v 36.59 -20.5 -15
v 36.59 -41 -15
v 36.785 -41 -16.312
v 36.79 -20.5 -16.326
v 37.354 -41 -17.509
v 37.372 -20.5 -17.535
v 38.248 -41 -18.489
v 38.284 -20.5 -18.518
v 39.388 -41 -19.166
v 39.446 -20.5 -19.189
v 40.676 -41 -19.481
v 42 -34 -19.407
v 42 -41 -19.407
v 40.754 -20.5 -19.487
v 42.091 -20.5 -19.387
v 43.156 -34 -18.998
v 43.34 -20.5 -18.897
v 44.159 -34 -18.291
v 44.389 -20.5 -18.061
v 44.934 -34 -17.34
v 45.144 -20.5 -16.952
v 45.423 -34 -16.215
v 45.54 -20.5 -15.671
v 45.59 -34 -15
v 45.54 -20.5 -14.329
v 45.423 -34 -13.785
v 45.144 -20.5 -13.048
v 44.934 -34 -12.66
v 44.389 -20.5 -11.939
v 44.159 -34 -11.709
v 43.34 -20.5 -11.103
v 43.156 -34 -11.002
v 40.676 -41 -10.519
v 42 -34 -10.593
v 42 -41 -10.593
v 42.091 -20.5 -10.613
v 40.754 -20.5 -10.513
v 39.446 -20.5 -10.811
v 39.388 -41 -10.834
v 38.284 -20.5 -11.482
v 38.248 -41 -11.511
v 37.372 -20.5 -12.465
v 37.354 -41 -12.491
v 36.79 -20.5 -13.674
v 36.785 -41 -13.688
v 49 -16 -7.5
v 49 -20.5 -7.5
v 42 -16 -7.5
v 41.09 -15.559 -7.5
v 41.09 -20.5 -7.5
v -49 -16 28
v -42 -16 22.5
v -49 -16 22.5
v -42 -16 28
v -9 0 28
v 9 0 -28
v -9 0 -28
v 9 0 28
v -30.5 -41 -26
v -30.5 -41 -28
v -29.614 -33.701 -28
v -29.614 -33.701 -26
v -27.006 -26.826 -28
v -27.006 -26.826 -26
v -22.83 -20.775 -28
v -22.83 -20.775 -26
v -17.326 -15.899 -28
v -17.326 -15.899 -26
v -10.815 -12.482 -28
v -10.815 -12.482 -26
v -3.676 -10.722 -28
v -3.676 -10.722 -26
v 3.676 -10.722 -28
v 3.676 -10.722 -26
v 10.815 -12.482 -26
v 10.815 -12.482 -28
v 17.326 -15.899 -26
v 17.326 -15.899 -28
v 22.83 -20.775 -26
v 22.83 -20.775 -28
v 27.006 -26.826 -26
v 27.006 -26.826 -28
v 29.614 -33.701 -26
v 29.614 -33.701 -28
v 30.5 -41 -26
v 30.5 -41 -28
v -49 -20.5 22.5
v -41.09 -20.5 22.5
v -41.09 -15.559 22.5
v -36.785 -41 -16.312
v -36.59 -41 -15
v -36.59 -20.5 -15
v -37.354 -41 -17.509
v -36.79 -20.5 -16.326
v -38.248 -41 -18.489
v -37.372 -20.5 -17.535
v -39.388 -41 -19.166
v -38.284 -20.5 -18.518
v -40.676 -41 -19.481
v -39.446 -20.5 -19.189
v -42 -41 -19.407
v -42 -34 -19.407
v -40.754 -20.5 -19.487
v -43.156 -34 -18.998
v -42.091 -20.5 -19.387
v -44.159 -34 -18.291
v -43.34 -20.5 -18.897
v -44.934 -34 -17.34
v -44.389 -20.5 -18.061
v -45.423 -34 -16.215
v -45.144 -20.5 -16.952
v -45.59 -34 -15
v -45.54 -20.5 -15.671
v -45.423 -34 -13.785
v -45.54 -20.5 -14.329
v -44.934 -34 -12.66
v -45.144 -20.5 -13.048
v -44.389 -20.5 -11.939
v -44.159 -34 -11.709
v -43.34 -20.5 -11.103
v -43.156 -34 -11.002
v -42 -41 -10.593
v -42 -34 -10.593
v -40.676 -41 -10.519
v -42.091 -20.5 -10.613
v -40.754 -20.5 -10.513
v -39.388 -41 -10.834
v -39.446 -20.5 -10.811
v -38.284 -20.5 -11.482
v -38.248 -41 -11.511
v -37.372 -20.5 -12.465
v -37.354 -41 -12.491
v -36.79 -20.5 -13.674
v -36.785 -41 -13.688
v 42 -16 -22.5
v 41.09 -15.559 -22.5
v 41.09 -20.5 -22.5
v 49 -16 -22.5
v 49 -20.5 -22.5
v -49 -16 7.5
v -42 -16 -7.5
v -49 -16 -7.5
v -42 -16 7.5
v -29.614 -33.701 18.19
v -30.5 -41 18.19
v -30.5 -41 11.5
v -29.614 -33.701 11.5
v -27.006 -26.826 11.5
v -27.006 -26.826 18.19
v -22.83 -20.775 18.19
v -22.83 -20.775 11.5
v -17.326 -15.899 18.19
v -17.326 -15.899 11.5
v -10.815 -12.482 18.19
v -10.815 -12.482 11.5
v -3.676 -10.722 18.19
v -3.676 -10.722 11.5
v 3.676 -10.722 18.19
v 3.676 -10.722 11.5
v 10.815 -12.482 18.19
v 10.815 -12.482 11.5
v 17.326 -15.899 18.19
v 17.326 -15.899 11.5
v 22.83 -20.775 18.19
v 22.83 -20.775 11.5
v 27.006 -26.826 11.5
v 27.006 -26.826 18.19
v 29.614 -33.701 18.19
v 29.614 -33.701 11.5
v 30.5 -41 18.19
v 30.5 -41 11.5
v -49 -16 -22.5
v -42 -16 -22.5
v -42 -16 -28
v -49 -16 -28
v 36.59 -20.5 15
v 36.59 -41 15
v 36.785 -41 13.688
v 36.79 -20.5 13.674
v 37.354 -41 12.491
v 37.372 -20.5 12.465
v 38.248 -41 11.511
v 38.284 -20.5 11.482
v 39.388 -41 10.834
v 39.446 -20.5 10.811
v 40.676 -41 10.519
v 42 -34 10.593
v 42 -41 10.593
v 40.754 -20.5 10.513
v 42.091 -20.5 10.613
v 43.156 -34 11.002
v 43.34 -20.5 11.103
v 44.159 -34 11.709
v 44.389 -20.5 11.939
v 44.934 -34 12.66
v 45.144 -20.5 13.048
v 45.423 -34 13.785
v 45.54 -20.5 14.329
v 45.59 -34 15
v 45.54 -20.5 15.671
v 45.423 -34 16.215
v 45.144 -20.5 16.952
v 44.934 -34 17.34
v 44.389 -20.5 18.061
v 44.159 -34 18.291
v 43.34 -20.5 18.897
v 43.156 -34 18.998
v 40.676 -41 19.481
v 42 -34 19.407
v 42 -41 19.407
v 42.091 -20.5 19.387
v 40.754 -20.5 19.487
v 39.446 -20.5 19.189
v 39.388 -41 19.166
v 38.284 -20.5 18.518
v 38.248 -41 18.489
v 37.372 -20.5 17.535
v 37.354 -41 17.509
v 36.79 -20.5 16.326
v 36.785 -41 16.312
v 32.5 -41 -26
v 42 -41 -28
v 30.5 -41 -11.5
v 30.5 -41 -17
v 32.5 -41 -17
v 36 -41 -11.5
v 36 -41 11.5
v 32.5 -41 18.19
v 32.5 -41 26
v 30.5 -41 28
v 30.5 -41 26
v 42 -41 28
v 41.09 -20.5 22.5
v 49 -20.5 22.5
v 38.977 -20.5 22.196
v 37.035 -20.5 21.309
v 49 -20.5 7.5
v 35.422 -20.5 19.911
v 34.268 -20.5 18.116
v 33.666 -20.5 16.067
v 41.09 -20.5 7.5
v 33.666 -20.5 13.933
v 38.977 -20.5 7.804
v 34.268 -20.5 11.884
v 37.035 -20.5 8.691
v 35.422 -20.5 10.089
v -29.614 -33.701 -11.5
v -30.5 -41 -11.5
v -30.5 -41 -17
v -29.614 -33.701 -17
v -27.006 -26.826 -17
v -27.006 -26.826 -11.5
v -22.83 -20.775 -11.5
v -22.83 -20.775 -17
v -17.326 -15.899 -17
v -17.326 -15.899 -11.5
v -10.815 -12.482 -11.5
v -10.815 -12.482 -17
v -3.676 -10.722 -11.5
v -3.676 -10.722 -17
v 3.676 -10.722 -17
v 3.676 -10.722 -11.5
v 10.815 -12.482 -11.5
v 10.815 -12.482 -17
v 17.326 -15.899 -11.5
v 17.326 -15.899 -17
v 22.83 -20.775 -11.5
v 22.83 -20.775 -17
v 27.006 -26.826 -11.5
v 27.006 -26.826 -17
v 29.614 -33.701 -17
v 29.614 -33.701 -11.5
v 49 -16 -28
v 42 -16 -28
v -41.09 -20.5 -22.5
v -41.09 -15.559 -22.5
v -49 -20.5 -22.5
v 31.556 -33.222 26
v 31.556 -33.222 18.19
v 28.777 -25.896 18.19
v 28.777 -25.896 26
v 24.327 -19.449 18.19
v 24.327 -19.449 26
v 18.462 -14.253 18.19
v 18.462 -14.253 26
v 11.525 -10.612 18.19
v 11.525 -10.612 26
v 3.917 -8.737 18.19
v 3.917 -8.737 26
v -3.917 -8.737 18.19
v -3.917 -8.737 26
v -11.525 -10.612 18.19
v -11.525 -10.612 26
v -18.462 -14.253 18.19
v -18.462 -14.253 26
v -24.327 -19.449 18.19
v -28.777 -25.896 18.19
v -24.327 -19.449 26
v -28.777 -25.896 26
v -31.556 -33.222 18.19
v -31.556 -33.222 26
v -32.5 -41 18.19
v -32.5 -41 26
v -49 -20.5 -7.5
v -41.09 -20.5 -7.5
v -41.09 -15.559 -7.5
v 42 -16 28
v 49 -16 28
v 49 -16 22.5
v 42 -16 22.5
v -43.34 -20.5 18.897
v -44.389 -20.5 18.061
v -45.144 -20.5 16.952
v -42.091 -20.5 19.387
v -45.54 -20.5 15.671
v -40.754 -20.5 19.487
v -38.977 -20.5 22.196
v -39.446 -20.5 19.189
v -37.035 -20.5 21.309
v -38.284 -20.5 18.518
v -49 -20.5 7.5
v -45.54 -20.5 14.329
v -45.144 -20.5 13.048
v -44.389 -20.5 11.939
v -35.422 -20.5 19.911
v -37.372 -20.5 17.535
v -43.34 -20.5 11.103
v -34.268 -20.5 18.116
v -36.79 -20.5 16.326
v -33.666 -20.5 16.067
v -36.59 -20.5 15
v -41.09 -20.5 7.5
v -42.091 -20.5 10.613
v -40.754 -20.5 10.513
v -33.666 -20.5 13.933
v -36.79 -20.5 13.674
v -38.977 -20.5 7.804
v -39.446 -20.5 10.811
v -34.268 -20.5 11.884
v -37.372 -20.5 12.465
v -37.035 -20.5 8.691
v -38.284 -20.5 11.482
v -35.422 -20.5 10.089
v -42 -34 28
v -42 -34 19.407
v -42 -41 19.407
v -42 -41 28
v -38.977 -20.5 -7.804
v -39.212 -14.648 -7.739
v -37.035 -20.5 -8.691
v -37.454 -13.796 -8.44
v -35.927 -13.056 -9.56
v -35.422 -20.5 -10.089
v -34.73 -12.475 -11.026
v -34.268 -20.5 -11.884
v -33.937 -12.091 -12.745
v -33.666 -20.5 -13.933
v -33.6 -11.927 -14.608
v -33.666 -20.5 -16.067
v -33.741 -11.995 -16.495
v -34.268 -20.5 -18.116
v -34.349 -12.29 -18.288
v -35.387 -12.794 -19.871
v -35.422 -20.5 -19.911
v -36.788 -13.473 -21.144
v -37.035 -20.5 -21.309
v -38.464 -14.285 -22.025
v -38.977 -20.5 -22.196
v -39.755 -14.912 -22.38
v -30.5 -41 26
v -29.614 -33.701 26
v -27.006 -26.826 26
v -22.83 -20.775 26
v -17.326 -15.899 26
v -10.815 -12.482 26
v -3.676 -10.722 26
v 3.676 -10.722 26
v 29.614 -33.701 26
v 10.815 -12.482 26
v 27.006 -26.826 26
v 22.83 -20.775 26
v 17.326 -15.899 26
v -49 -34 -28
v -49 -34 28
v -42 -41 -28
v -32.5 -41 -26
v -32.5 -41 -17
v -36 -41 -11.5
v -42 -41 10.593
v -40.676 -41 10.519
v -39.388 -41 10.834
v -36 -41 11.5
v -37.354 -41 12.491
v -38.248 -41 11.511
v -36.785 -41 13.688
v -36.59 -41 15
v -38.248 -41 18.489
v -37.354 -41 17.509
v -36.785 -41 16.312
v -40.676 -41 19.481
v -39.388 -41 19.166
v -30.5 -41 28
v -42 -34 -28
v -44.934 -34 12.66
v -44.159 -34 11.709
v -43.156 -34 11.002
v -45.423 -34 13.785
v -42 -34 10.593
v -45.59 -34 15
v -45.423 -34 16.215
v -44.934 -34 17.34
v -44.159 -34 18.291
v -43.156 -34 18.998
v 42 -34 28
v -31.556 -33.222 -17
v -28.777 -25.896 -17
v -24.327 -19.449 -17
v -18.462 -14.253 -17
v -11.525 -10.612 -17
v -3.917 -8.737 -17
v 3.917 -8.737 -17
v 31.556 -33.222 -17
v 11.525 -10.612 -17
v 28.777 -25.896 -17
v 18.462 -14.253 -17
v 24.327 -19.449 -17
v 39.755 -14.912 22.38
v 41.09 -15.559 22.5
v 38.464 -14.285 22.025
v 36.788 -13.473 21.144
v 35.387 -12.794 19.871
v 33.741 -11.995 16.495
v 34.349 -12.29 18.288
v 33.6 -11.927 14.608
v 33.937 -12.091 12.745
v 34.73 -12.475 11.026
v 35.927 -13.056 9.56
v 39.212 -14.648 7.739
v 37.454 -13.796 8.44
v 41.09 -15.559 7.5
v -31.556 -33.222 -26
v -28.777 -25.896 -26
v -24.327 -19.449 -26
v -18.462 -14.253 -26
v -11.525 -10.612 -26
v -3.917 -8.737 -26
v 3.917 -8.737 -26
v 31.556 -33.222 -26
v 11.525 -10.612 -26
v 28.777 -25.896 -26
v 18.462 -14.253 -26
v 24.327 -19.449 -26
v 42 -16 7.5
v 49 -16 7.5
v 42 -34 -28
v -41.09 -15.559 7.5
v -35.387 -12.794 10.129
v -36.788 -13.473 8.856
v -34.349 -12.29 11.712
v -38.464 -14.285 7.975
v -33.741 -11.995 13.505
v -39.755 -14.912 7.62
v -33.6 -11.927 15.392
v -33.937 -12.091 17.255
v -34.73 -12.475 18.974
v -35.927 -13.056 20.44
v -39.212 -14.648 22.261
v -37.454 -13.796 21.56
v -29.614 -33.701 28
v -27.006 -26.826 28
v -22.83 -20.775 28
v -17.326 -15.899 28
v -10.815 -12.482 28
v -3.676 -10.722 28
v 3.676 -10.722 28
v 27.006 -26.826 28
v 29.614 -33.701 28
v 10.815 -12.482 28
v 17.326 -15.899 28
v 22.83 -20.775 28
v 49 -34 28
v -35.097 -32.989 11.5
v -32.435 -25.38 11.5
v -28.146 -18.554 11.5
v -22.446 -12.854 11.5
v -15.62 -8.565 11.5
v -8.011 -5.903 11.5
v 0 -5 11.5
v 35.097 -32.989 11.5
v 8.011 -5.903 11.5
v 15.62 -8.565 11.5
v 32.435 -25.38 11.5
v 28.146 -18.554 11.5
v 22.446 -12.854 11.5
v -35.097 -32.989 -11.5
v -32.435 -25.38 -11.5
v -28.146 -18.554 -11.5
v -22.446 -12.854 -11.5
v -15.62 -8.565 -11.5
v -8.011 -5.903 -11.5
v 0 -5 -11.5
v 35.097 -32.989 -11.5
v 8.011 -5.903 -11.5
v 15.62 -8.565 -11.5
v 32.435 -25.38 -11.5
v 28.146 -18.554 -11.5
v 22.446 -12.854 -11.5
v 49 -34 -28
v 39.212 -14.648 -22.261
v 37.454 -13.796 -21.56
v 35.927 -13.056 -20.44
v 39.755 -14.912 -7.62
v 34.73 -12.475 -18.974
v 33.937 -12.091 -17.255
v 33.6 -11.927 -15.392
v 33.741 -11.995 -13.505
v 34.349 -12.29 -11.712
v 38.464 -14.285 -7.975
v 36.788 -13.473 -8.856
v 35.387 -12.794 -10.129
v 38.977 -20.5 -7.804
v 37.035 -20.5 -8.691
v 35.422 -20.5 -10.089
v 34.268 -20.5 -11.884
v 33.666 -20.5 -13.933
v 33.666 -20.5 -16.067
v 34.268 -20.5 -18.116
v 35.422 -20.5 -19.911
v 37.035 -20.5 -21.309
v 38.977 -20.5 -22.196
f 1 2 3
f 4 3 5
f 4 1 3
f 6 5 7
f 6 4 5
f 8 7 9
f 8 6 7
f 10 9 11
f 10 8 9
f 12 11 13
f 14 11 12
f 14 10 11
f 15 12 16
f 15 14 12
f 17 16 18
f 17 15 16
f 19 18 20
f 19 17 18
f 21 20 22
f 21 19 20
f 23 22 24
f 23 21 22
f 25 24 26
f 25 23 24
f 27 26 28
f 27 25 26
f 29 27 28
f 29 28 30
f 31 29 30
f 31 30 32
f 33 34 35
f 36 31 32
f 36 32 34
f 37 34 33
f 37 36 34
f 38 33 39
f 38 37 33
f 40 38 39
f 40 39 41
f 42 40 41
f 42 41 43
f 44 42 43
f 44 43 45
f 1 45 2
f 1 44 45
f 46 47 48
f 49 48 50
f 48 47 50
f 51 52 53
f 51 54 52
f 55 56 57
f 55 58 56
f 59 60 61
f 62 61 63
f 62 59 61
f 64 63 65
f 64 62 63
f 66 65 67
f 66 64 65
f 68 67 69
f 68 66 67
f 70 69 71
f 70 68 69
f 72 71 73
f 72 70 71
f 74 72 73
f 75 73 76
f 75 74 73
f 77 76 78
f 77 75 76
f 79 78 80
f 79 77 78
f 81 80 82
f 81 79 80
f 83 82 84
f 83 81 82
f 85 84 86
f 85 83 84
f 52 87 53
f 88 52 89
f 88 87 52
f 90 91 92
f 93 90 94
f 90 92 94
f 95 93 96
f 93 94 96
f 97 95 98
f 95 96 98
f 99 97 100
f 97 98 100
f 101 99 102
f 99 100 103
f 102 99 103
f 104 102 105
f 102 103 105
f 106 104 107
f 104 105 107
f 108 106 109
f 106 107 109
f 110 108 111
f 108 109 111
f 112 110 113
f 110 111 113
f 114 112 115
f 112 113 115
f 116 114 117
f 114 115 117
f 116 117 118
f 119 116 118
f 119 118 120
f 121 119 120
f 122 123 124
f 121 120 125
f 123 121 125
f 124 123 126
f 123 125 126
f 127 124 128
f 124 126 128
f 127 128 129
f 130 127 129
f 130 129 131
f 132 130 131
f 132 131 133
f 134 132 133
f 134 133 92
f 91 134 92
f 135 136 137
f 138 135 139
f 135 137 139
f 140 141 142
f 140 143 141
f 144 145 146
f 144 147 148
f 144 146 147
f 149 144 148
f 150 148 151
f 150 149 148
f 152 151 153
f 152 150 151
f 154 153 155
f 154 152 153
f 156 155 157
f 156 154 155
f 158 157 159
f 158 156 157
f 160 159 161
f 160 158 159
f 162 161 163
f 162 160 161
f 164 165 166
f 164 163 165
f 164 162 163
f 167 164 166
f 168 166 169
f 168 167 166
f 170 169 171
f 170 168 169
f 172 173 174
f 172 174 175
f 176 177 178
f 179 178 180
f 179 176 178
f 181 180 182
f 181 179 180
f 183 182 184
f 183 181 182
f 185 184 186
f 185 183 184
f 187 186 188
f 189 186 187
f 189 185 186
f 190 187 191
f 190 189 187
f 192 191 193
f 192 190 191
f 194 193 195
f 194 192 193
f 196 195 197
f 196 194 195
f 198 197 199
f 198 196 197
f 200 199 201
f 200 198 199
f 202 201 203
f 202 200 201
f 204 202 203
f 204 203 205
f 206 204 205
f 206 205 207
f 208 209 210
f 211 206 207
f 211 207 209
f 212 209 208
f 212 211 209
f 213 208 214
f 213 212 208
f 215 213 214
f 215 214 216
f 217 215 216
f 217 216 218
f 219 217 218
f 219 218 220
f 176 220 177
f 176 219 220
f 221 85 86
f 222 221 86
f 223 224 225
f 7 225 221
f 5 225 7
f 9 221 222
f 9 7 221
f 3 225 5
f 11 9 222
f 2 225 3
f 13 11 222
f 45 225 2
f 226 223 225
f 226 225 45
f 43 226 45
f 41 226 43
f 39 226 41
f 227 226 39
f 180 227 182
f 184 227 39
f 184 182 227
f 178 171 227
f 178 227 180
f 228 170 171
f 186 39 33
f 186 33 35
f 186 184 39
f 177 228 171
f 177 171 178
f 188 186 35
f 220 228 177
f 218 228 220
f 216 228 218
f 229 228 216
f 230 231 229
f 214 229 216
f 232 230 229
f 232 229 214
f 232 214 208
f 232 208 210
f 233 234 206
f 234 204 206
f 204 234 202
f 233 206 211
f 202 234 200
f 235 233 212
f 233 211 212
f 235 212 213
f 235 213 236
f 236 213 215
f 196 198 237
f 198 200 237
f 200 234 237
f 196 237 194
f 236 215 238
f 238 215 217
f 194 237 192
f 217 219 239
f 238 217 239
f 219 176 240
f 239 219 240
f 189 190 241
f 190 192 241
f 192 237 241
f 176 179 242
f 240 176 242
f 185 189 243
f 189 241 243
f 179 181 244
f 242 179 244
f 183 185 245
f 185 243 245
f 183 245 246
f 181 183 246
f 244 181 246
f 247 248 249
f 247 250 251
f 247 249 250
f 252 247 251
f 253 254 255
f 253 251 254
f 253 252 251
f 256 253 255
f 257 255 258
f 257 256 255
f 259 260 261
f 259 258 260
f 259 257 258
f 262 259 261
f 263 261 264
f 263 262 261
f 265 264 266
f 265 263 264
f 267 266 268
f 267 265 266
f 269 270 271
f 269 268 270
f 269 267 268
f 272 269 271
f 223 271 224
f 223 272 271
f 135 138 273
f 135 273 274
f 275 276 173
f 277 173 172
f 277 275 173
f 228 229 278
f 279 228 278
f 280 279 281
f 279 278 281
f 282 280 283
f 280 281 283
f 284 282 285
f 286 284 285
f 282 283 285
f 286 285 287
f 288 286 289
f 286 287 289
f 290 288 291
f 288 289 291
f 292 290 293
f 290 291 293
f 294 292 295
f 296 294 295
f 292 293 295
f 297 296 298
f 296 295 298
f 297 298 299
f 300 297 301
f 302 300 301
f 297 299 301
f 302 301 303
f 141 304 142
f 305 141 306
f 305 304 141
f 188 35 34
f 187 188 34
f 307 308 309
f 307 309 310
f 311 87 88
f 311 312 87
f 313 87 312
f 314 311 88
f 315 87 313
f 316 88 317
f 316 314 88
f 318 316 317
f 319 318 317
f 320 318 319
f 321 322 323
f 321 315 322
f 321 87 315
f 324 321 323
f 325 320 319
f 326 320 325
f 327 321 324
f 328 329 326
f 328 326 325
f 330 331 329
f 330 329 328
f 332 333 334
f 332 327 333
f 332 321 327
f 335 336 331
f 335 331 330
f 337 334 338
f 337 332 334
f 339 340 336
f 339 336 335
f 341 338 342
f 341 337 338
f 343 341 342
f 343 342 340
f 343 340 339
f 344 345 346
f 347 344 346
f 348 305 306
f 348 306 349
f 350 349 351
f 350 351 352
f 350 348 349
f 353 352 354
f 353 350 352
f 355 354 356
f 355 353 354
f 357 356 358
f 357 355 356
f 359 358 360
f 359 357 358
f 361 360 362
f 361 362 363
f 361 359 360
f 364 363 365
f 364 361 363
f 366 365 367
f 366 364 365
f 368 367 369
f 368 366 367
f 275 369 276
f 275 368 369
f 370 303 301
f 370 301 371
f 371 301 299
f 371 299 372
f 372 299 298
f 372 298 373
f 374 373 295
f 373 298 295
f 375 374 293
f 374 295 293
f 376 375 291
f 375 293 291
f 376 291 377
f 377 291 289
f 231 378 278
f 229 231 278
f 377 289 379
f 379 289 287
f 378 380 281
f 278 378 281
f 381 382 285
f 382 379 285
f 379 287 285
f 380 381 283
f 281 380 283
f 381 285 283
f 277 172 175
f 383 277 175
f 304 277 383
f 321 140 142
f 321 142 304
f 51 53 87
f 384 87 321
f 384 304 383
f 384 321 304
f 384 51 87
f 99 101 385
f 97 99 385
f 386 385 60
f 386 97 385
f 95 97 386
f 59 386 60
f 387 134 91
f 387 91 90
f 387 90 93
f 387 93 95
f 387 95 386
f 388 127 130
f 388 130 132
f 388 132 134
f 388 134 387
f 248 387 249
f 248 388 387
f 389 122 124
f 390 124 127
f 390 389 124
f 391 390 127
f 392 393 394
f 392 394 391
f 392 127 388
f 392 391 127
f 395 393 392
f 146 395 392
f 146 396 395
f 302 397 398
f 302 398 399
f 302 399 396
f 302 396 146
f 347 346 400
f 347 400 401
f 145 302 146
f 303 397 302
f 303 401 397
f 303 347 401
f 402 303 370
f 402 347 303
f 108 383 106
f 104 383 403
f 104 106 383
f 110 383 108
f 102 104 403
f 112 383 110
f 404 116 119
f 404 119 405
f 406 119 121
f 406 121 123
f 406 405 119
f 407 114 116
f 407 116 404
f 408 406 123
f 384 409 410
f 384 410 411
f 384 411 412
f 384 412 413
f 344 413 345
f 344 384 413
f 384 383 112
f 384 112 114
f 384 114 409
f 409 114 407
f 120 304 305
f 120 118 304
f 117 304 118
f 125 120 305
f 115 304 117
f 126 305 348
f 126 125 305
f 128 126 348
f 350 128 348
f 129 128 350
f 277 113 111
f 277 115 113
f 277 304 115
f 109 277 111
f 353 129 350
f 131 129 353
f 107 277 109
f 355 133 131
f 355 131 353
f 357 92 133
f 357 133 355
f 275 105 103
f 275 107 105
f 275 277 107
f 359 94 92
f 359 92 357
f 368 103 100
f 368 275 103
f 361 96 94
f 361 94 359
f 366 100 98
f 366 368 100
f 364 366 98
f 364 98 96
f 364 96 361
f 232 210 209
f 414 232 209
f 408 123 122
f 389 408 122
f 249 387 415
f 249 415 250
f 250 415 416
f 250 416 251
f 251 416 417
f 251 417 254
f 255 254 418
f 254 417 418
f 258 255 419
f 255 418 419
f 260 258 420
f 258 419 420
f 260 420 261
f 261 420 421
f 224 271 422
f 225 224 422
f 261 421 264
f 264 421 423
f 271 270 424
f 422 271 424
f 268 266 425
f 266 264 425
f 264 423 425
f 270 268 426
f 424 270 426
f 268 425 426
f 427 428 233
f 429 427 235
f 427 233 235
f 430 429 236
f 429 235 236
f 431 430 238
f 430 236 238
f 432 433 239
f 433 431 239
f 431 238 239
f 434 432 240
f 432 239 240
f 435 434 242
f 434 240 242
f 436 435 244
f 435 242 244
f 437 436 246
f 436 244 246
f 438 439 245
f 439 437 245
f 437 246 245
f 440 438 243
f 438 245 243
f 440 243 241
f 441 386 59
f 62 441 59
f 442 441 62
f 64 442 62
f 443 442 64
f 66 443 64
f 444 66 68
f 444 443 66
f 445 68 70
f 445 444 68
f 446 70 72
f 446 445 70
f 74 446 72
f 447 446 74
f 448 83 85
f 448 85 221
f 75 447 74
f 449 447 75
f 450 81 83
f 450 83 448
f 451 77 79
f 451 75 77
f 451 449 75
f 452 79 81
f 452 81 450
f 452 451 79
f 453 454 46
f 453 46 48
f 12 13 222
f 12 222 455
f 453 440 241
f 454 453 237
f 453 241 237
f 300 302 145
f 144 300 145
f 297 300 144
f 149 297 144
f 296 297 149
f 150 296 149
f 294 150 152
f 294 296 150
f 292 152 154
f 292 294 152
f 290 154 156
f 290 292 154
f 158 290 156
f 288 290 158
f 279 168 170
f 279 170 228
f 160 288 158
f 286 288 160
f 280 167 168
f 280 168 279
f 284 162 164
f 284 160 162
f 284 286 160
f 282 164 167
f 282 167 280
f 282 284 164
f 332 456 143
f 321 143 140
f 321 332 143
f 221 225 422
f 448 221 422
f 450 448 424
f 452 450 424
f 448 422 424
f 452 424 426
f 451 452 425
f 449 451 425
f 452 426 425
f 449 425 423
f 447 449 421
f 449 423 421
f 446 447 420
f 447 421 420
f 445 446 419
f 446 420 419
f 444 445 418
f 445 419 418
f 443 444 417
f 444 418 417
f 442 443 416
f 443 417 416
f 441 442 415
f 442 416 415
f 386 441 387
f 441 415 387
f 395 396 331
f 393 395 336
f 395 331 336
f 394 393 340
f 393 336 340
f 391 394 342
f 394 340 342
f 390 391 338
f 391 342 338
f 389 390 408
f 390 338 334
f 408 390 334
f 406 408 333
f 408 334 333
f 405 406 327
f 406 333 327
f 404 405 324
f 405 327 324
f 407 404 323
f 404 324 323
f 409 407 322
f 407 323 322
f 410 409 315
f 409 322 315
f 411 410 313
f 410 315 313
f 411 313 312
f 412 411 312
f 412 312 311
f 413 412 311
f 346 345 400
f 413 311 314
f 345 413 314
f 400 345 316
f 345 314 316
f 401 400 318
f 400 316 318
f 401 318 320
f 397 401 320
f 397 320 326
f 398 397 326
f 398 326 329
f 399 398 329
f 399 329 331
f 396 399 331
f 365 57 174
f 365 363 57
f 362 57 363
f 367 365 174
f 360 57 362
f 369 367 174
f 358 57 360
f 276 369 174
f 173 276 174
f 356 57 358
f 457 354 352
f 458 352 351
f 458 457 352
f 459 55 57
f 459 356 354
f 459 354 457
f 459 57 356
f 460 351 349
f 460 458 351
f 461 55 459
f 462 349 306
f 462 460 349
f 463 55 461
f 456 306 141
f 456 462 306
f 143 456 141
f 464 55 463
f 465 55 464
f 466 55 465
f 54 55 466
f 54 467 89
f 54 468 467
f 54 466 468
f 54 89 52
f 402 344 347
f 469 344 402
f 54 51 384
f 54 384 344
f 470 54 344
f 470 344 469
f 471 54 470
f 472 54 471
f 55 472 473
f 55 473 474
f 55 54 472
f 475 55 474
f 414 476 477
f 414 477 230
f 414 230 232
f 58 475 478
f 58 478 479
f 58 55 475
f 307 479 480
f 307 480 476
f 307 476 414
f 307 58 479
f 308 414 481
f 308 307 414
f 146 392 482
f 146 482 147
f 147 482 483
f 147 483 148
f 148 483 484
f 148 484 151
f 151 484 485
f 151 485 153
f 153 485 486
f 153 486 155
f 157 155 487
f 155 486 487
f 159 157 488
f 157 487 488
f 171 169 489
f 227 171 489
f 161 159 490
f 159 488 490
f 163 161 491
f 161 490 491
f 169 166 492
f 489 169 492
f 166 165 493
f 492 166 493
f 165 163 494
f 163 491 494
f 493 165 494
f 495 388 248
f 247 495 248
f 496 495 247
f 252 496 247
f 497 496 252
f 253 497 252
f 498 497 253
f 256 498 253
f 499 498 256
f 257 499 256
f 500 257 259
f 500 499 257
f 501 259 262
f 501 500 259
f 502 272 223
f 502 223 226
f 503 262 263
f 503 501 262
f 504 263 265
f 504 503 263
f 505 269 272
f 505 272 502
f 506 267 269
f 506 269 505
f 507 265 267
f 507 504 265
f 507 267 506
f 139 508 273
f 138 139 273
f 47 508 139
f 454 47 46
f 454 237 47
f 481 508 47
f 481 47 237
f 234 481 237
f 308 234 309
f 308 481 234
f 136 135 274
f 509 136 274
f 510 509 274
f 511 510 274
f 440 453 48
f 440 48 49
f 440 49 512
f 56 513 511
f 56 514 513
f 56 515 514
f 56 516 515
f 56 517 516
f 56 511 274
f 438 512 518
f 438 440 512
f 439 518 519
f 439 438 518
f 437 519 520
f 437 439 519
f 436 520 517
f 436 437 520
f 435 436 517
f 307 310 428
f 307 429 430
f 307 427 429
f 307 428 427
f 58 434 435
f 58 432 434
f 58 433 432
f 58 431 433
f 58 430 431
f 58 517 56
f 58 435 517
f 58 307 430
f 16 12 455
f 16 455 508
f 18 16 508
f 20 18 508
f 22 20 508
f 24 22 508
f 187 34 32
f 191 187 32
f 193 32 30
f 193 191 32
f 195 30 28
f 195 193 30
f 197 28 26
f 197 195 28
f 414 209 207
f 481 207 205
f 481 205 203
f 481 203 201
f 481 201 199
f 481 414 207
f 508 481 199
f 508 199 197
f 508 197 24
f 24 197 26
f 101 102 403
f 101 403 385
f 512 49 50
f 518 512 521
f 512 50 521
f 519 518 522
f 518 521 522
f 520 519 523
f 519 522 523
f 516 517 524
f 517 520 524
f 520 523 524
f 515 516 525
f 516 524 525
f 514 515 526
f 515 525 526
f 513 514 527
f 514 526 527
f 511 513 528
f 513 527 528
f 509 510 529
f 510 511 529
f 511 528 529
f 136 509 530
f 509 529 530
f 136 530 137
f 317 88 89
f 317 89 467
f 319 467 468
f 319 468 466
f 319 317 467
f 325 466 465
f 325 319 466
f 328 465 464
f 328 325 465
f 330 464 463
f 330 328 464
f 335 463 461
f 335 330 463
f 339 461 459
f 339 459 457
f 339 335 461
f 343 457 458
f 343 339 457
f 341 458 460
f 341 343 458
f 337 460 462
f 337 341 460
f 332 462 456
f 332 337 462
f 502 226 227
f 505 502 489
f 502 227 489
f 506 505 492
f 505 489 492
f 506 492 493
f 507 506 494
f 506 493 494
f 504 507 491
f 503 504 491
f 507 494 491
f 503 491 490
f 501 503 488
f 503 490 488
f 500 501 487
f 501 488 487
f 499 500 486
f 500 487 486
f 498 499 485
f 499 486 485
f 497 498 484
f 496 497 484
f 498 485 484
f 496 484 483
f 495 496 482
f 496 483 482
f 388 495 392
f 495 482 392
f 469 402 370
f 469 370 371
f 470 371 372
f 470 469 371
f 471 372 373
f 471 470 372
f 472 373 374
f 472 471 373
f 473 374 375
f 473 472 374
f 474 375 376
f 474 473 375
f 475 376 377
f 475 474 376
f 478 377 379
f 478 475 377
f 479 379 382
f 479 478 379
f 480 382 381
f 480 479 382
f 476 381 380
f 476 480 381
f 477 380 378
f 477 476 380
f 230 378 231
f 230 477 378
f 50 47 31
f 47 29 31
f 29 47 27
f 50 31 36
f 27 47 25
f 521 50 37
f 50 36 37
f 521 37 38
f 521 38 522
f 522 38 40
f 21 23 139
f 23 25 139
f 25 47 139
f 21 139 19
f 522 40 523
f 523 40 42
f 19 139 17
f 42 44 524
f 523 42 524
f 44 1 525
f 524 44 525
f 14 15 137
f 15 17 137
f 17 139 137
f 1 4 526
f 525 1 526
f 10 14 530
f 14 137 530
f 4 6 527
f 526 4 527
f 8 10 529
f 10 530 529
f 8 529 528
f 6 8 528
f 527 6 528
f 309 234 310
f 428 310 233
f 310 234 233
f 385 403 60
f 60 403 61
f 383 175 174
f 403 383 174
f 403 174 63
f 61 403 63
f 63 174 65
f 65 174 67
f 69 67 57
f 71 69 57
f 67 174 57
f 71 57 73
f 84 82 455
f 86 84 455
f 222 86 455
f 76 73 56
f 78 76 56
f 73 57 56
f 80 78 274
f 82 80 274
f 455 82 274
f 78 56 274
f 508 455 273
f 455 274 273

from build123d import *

# Parameters (mm, degrees)
Y_KSEKLIK_EKSTR_ZYON1_DEPTH = 28
KES_EKSTR_ZYON1_DEPTH       = 7.81
KES_EKSTR_ZYON2_DEPTH       = 23
KES_EKSTR_ZYON3_DEPTH       = 9
KES_EKSTR_ZYON4_DEPTH       = 9
KES_EKSTR_ZYON5_START       = -4.5
KES_EKSTR_ZYON5_DEPTH       = 4.5
IZIM7_R                     = 4.5
KES_EKSTR_ZYON6_DEPTH       = 61.043734061


with BuildPart() as part:
    # Çizim1 → Yükseklik-Ekstrüzyon1 (new, symmetric)
    with BuildSketch(Plane.XY):
        with BuildLine():
            Line((9, 0), (-9, 0))
            Line((-9, 0), (-42, -16))
            Line((-42, -16), (-49, -16))
            Line((-49, -16), (-49, -34))
            Line((-49, -34), (-42, -34))
            Line((-42, -34), (-42, -41))
            Line((-42, -41), (-30.5, -41))
            ThreePointArc((-30.5, -41), (0, -10.5), (30.5, -41))
            Line((30.5, -41), (42, -41))
            Line((42, -41), (42, -34))
            Line((42, -34), (49, -34))
            Line((49, -34), (49, -16))
            Line((49, -16), (42, -16))
            Line((42, -16), (9, 0))
        make_face()
    extrude(amount=Y_KSEKLIK_EKSTR_ZYON1_DEPTH, both=True)

    # Çizim2 → Kes-Ekstrüzyon1 (cut)
    with BuildSketch(Plane.XY.offset(26)):
        with BuildLine():
            Line((-32.5, -41), (32.5, -41))
            ThreePointArc((32.5, -41), (0, -8.5), (-32.5, -41))
        make_face()
    extrude(amount=-KES_EKSTR_ZYON1_DEPTH, mode=Mode.SUBTRACT)

    # Çizim3 → Kes-Ekstrüzyon2 (cut)
    with BuildSketch(Plane.XY.offset(11.5)):
        with BuildLine():
            Line((-36, -41), (36, -41))
            ThreePointArc((36, -41), (0, -5), (-36, -41))
        make_face()
    extrude(amount=-KES_EKSTR_ZYON2_DEPTH, mode=Mode.SUBTRACT)

    # Çizim4 → Kes-Ekstrüzyon3 (cut)
    with BuildSketch(Plane.XY.offset(-17)):
        with BuildLine():
            Line((-32.5, -41), (32.5, -41))
            ThreePointArc((32.5, -41), (0, -8.5), (-32.5, -41))
        make_face()
    extrude(amount=-KES_EKSTR_ZYON3_DEPTH, mode=Mode.SUBTRACT)

    # Çizim5 → Kes-Ekstrüzyon4 (cut)
    with BuildSketch(Plane(origin=(0, -16, 0), x_dir=(1, 0, 0), z_dir=(0, 1, 0))):
        with BuildLine():
            Line((41.09, -7.5), (49, -7.5))
            Line((49, -7.5), (49, -22.5))
            Line((49, -22.5), (41.09, -22.5))
            ThreePointArc((41.09, -22.5), (33.59, -15), (41.09, -7.5))
        make_face()
        with BuildLine():
            Line((41.09, 22.5), (49, 22.5))
            Line((49, 22.5), (49, 7.5))
            Line((49, 7.5), (41.09, 7.5))
            ThreePointArc((41.09, 7.5), (33.59, 15), (41.09, 22.5))
        make_face()
    kes_ekstr_zyon4 = extrude(amount=KES_EKSTR_ZYON4_DEPTH, mode=Mode.SUBTRACT)

    # Çizim5<2> → Kes-Ekstrüzyon5 (cut)
    with BuildSketch(Plane(origin=(0, -16, 0), x_dir=(1, 0, 0), z_dir=(0, 1, 0)).offset(KES_EKSTR_ZYON5_START)):
        with BuildLine():
            Line((41.09, -7.5), (49, -7.5))
            Line((49, -7.5), (49, -22.5))
            Line((49, -22.5), (41.09, -22.5))
            ThreePointArc((41.09, -22.5), (33.59, -15), (41.09, -7.5))
        make_face()
        with BuildLine():
            Line((41.09, 22.5), (49, 22.5))
            Line((49, 22.5), (49, 7.5))
            Line((49, 7.5), (41.09, 7.5))
            ThreePointArc((41.09, 7.5), (33.59, 15), (41.09, 22.5))
        make_face()
    kes_ekstr_zyon5 = extrude(amount=KES_EKSTR_ZYON5_DEPTH, mode=Mode.SUBTRACT)

    # Aynalama1: Kes-Ekstrüzyon4, Kes-Ekstrüzyon5 across plane
    add(kes_ekstr_zyon4.mirror(Plane(origin=(0, 0, 0), x_dir=(0, 0, 1), z_dir=(1, 0, 0))), mode=Mode.SUBTRACT)
    add(kes_ekstr_zyon5.mirror(Plane(origin=(0, 0, 0), x_dir=(0, 0, 1), z_dir=(1, 0, 0))), mode=Mode.SUBTRACT)

    # Çizim7 → Kes-Ekstrüzyon6 (cut, through all)
    with BuildSketch(Plane(origin=(0, -20.5, 0), x_dir=(1, 0, 0), z_dir=(0, 1, 0))):
        with Locations((-41.09, -15)):
            Circle(IZIM7_R)
        with Locations((-41.09, 15)):
            Circle(IZIM7_R)
    kes_ekstr_zyon6 = extrude(amount=-KES_EKSTR_ZYON6_DEPTH, mode=Mode.SUBTRACT)

    # Aynalama2: Kes-Ekstrüzyon6 across plane
    add(kes_ekstr_zyon6.mirror(Plane(origin=(0, 0, 0), x_dir=(0, 0, 1), z_dir=(1, 0, 0))), mode=Mode.SUBTRACT)


solid = part.part
